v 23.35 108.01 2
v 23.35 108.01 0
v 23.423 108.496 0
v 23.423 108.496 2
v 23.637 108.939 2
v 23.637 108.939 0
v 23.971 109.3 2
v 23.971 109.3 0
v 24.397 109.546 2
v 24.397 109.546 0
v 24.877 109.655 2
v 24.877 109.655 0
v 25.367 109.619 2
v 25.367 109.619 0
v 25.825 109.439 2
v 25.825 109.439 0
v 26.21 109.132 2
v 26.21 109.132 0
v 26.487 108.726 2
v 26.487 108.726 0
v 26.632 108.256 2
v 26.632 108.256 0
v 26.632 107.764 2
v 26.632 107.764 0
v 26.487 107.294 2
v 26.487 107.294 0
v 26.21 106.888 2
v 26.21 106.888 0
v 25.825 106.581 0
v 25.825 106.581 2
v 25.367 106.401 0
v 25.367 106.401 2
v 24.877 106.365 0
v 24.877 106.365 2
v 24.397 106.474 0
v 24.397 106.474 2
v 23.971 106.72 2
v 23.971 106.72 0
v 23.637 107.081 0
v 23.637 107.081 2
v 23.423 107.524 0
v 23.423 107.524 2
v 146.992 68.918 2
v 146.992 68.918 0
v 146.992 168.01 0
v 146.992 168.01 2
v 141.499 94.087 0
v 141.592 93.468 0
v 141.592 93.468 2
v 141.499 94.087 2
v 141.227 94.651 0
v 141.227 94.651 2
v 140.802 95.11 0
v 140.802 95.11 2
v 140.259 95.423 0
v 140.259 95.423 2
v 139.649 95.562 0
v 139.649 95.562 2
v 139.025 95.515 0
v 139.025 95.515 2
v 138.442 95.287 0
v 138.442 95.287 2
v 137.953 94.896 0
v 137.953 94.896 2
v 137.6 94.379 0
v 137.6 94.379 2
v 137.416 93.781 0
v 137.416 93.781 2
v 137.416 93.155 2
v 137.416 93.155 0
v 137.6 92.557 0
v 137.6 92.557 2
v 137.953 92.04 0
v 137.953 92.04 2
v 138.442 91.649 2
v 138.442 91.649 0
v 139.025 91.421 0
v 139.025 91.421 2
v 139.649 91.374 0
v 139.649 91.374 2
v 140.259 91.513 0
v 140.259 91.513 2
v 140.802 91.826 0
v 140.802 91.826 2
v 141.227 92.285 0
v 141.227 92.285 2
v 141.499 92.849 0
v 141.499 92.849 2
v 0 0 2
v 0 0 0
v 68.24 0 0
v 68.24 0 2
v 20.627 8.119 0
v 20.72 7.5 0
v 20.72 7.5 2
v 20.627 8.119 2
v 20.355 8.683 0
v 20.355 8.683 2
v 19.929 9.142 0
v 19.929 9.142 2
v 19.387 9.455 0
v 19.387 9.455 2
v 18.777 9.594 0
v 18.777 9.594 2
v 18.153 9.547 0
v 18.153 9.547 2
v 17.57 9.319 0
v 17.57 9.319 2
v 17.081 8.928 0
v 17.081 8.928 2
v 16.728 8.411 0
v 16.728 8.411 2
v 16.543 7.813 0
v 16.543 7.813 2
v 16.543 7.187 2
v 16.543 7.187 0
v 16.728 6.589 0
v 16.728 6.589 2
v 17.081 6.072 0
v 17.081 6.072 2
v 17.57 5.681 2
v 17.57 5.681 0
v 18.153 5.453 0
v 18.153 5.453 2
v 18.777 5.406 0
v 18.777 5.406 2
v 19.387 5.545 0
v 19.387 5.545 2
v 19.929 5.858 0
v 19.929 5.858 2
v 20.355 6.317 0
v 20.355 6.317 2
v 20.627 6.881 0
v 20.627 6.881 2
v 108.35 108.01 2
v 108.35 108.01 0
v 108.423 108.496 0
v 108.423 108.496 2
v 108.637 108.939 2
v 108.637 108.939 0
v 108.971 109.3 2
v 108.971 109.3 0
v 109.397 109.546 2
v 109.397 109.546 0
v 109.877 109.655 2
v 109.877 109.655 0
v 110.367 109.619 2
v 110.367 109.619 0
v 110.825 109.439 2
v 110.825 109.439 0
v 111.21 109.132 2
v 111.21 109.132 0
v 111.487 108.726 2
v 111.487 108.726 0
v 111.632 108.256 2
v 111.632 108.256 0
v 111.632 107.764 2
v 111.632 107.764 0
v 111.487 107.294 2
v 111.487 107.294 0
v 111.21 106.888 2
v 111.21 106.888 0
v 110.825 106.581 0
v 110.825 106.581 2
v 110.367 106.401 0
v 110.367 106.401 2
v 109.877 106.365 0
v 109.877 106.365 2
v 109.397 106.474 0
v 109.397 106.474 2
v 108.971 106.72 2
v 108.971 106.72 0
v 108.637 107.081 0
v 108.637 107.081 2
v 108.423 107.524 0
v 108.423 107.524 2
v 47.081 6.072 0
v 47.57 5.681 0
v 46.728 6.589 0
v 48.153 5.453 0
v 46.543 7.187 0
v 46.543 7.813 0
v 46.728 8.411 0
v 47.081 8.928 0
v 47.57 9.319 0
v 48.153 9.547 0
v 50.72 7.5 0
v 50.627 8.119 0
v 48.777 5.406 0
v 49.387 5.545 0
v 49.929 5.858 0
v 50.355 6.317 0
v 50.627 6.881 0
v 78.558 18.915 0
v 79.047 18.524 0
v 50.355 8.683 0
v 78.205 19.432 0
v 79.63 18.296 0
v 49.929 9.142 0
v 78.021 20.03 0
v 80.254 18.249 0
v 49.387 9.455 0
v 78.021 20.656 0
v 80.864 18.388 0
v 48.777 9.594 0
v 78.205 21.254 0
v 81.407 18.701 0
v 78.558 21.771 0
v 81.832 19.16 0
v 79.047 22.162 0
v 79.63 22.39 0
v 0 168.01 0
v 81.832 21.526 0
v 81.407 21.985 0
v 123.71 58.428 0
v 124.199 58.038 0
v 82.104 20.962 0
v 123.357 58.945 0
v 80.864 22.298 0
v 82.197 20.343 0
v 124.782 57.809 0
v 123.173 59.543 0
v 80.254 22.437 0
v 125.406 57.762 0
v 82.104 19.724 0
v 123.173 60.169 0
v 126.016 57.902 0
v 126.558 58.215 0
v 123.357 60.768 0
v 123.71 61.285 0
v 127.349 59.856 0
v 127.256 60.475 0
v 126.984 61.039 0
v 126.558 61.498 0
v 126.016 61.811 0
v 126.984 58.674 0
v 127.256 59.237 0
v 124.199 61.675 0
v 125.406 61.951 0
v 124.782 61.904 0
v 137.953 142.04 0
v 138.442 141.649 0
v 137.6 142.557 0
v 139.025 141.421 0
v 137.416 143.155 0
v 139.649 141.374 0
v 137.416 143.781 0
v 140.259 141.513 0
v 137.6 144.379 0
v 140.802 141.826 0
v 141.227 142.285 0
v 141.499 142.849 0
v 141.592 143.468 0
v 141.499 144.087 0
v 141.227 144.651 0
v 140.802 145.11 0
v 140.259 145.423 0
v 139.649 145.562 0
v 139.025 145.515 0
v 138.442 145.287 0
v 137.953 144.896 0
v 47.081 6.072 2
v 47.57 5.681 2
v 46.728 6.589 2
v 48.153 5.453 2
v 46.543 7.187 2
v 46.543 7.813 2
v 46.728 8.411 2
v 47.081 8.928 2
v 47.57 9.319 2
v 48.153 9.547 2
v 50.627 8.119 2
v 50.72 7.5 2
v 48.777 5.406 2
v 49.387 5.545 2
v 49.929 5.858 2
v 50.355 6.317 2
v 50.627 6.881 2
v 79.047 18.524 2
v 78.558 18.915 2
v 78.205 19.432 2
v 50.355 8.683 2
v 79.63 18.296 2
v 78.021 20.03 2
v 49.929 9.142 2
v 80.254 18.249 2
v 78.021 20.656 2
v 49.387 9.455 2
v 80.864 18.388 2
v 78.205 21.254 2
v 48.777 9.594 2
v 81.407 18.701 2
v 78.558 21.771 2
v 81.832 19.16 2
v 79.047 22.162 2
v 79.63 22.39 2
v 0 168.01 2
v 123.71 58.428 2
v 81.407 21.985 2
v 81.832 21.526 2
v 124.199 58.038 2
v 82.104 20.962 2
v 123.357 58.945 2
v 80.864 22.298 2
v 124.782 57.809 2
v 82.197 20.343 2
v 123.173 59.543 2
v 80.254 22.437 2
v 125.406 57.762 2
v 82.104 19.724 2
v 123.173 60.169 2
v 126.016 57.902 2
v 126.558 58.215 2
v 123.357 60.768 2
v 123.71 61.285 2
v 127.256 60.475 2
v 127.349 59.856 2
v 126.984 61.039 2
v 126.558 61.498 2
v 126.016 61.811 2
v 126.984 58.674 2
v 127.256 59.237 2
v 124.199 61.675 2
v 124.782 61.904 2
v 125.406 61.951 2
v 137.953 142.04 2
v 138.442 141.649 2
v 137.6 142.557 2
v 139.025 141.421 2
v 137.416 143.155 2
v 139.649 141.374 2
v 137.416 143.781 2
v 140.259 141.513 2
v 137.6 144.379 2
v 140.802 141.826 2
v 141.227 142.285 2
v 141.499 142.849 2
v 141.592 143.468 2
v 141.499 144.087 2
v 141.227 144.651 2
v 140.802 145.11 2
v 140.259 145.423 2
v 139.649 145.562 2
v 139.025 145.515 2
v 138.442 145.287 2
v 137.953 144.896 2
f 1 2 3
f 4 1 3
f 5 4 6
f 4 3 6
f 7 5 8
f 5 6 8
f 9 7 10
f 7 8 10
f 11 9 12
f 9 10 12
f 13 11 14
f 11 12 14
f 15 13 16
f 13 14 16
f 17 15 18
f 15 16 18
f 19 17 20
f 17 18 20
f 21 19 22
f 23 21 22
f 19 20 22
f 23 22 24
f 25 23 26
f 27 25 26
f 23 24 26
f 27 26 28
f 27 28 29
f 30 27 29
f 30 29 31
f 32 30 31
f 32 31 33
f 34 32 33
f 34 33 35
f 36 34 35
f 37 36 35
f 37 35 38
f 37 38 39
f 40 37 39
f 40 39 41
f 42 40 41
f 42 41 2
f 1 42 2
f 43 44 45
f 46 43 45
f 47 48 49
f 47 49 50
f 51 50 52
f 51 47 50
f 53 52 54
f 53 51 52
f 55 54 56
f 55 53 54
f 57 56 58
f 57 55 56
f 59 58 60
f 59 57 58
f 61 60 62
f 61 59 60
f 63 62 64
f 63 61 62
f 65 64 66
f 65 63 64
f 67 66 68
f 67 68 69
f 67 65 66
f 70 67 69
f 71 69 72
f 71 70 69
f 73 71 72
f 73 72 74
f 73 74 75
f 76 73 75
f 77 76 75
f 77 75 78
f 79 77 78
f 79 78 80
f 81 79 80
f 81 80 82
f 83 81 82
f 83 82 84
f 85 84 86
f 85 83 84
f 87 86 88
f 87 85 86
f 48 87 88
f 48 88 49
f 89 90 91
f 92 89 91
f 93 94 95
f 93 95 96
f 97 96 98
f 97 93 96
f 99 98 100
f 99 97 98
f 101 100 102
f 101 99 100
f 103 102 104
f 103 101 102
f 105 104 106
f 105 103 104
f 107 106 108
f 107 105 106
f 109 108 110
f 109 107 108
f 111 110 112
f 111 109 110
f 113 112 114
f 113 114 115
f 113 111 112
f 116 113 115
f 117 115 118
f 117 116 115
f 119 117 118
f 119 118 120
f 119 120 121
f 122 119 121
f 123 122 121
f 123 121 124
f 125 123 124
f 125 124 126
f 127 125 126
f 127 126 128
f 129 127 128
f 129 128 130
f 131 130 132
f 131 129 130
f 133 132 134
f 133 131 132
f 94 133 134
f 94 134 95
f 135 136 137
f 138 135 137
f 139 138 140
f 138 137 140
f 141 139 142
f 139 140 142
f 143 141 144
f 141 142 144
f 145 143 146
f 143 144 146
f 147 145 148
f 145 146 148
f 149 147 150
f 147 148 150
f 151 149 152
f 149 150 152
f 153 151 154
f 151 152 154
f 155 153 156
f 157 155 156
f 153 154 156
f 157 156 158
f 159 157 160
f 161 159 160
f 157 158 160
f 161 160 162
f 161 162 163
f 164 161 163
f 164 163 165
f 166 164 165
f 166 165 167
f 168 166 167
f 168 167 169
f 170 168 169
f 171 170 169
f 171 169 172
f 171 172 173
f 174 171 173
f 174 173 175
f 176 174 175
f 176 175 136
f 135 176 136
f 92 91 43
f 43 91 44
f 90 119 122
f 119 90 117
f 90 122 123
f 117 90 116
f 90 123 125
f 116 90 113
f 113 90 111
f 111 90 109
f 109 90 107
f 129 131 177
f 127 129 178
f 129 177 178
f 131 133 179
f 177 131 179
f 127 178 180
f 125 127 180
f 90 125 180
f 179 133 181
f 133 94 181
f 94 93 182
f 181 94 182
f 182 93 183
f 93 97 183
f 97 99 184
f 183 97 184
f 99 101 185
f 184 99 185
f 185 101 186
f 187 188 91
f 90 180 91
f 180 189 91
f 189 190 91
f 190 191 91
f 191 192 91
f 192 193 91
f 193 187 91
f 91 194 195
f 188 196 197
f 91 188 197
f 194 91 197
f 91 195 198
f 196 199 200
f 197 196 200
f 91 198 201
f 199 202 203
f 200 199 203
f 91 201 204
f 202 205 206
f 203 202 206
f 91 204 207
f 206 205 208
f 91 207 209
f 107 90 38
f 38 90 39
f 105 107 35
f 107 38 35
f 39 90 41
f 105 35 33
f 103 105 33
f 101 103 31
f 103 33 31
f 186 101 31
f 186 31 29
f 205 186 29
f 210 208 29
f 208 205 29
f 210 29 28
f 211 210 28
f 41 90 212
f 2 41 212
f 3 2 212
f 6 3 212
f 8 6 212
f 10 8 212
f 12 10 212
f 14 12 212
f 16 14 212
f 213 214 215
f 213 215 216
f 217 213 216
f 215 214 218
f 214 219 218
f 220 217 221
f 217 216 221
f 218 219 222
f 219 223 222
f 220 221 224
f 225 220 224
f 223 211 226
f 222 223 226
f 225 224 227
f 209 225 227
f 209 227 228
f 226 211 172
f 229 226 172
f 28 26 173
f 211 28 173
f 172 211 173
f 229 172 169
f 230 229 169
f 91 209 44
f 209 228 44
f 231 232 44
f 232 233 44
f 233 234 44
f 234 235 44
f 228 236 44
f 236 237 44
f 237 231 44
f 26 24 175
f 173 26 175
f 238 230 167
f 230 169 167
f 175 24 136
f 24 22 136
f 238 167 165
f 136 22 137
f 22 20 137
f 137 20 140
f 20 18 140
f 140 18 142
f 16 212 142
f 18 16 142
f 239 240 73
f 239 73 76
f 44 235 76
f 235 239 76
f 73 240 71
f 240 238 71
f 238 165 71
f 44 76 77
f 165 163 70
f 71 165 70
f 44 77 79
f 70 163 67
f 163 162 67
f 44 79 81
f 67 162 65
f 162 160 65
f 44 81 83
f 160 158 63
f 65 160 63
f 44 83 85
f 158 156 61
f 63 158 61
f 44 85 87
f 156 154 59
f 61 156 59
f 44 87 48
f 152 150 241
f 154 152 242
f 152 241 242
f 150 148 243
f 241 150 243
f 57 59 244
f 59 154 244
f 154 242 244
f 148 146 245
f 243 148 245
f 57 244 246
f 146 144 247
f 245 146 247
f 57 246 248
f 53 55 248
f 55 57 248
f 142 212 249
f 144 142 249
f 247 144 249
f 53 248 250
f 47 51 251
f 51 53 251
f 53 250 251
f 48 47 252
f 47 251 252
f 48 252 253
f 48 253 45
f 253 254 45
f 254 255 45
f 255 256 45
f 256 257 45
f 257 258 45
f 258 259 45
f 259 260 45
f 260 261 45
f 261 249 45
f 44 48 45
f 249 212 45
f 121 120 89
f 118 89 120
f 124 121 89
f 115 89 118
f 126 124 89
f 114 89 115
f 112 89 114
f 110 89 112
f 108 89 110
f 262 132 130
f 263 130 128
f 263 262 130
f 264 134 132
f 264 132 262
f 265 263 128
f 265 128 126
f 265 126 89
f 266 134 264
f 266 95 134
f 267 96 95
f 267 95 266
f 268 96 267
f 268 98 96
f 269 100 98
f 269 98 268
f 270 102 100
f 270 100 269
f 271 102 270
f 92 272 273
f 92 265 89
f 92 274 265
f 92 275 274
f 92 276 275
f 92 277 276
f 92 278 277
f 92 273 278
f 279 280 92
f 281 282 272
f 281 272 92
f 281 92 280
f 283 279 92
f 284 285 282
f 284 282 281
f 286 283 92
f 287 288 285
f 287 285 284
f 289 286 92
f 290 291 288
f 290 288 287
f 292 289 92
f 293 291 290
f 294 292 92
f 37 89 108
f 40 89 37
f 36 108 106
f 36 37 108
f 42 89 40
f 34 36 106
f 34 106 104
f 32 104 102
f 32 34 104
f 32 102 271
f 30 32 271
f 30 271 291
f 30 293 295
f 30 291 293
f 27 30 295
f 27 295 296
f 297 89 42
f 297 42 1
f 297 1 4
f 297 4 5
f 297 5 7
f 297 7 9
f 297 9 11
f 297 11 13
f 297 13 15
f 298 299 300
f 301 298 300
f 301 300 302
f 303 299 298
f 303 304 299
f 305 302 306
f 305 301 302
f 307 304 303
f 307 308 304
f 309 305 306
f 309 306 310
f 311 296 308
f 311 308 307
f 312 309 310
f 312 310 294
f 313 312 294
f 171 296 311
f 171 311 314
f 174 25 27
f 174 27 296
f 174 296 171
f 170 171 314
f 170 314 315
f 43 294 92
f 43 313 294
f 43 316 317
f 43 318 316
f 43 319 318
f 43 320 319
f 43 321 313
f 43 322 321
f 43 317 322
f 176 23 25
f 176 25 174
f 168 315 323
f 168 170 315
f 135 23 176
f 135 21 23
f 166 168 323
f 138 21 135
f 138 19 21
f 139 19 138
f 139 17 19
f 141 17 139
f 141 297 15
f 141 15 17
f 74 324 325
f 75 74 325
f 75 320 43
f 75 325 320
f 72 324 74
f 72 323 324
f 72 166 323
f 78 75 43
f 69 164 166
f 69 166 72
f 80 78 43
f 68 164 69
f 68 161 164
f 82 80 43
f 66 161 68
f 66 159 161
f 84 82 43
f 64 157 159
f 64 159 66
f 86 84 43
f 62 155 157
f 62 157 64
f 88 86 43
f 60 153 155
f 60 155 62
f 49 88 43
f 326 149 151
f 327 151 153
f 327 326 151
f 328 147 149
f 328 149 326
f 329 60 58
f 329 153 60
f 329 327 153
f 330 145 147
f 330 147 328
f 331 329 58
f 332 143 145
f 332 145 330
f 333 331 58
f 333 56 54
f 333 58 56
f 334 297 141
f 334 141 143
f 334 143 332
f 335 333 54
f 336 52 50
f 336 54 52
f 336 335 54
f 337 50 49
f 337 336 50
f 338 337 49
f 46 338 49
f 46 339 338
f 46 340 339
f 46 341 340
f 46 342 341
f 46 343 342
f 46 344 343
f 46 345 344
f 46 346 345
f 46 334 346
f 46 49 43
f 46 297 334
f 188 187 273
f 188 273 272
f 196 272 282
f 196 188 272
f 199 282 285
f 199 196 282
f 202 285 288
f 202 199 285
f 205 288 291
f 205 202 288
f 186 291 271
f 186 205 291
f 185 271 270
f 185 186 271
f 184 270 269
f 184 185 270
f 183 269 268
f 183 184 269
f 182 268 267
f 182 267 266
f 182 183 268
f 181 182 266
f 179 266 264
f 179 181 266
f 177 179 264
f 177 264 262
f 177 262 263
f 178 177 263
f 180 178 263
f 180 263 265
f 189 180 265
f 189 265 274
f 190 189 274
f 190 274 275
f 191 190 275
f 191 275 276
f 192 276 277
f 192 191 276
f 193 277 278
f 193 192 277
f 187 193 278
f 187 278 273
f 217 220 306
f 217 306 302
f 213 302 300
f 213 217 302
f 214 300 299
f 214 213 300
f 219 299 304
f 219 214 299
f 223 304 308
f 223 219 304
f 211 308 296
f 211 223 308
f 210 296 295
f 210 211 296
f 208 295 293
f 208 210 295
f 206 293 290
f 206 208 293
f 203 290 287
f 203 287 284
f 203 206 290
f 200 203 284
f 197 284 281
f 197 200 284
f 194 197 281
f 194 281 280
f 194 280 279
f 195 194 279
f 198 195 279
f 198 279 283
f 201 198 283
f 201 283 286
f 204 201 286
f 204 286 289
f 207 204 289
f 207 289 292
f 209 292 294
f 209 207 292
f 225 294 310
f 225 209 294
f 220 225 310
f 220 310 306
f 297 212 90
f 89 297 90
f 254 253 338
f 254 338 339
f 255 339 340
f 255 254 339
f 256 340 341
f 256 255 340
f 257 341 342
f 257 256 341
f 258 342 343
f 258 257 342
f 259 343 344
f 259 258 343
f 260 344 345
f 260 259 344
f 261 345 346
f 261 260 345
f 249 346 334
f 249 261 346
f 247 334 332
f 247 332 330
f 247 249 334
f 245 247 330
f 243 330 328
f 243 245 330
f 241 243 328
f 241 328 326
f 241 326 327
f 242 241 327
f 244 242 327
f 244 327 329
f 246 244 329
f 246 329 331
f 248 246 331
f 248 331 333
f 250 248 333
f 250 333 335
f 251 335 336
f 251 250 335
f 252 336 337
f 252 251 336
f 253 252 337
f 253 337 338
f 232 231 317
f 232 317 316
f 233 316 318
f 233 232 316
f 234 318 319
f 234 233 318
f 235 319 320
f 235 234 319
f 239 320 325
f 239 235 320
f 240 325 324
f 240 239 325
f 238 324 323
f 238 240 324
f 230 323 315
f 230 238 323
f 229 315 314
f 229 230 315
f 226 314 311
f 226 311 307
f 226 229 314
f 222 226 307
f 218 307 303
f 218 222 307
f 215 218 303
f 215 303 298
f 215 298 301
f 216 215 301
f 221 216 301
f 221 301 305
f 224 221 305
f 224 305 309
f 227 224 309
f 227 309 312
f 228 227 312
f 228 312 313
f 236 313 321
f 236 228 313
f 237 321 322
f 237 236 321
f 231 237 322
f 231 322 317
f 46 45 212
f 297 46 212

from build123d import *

# Parameters (mm, degrees)
SKETCH_1_R          = 2.1
EXTRUDE_1_DEPTH     = 2
SKETCH_3_R          = 1
CUT_EXTRUDE_1_DEPTH = 10
M4X0_7_1_D          = 3.3
M4X0_7_1_DEPTH      = 11.5
M4X0_7_1_TIP        = 0.991420021


with BuildPart() as part:
    # ｽｹｯﾁ1 → ﾎﾞｽ - 押し出し1 (new body)
    with BuildSketch(Plane.XY):
        Polygon((0, 0), (68.24, 0), (146.992249894, 68.918108191), (146.992249894, 168.01), (0, 168.01), align=None)
        with Locations((18.62, 7.5)):
            Circle(SKETCH_1_R, mode=Mode.SUBTRACT)
        with Locations((48.62, 7.5)):
            Circle(SKETCH_1_R, mode=Mode.SUBTRACT)
        with Locations((139.492249894, 93.468108191)):
            Circle(SKETCH_1_R, mode=Mode.SUBTRACT)
        with Locations((139.492249894, 143.468108191)):
            Circle(SKETCH_1_R, mode=Mode.SUBTRACT)
        with Locations((125.249072144, 59.856479125)):
            Circle(SKETCH_1_R, mode=Mode.SUBTRACT)
        with Locations((80.097280518, 20.342991391)):
            Circle(SKETCH_1_R, mode=Mode.SUBTRACT)
    extrude(amount=EXTRUDE_1_DEPTH)

    # ｽｹｯﾁ3 → ｶｯﾄ - 押し出し1 (cut)
    with BuildSketch(Plane.XY.offset(2)):
        with Locations((25, 108.01)):
            Circle(SKETCH_3_R)
        with Locations((110, 108.01)):
            Circle(SKETCH_3_R)
    extrude(amount=-CUT_EXTRUDE_1_DEPTH, mode=Mode.SUBTRACT)

    # M4x0.7 ねじ穴1
    with Locations(Plane(origin=(25, 108.01, 2), x_dir=(1, 0, 0), z_dir=(0, 0, 1))):
        with Locations((0, 0), (85, 0)):
            Hole(M4X0_7_1_D / 2, depth=M4X0_7_1_DEPTH)
            with Locations((0, 0, -(M4X0_7_1_DEPTH + M4X0_7_1_TIP / 2))):  # 118° drill point
                Cone(0, M4X0_7_1_D / 2, M4X0_7_1_TIP, mode=Mode.SUBTRACT)


solid = part.part
